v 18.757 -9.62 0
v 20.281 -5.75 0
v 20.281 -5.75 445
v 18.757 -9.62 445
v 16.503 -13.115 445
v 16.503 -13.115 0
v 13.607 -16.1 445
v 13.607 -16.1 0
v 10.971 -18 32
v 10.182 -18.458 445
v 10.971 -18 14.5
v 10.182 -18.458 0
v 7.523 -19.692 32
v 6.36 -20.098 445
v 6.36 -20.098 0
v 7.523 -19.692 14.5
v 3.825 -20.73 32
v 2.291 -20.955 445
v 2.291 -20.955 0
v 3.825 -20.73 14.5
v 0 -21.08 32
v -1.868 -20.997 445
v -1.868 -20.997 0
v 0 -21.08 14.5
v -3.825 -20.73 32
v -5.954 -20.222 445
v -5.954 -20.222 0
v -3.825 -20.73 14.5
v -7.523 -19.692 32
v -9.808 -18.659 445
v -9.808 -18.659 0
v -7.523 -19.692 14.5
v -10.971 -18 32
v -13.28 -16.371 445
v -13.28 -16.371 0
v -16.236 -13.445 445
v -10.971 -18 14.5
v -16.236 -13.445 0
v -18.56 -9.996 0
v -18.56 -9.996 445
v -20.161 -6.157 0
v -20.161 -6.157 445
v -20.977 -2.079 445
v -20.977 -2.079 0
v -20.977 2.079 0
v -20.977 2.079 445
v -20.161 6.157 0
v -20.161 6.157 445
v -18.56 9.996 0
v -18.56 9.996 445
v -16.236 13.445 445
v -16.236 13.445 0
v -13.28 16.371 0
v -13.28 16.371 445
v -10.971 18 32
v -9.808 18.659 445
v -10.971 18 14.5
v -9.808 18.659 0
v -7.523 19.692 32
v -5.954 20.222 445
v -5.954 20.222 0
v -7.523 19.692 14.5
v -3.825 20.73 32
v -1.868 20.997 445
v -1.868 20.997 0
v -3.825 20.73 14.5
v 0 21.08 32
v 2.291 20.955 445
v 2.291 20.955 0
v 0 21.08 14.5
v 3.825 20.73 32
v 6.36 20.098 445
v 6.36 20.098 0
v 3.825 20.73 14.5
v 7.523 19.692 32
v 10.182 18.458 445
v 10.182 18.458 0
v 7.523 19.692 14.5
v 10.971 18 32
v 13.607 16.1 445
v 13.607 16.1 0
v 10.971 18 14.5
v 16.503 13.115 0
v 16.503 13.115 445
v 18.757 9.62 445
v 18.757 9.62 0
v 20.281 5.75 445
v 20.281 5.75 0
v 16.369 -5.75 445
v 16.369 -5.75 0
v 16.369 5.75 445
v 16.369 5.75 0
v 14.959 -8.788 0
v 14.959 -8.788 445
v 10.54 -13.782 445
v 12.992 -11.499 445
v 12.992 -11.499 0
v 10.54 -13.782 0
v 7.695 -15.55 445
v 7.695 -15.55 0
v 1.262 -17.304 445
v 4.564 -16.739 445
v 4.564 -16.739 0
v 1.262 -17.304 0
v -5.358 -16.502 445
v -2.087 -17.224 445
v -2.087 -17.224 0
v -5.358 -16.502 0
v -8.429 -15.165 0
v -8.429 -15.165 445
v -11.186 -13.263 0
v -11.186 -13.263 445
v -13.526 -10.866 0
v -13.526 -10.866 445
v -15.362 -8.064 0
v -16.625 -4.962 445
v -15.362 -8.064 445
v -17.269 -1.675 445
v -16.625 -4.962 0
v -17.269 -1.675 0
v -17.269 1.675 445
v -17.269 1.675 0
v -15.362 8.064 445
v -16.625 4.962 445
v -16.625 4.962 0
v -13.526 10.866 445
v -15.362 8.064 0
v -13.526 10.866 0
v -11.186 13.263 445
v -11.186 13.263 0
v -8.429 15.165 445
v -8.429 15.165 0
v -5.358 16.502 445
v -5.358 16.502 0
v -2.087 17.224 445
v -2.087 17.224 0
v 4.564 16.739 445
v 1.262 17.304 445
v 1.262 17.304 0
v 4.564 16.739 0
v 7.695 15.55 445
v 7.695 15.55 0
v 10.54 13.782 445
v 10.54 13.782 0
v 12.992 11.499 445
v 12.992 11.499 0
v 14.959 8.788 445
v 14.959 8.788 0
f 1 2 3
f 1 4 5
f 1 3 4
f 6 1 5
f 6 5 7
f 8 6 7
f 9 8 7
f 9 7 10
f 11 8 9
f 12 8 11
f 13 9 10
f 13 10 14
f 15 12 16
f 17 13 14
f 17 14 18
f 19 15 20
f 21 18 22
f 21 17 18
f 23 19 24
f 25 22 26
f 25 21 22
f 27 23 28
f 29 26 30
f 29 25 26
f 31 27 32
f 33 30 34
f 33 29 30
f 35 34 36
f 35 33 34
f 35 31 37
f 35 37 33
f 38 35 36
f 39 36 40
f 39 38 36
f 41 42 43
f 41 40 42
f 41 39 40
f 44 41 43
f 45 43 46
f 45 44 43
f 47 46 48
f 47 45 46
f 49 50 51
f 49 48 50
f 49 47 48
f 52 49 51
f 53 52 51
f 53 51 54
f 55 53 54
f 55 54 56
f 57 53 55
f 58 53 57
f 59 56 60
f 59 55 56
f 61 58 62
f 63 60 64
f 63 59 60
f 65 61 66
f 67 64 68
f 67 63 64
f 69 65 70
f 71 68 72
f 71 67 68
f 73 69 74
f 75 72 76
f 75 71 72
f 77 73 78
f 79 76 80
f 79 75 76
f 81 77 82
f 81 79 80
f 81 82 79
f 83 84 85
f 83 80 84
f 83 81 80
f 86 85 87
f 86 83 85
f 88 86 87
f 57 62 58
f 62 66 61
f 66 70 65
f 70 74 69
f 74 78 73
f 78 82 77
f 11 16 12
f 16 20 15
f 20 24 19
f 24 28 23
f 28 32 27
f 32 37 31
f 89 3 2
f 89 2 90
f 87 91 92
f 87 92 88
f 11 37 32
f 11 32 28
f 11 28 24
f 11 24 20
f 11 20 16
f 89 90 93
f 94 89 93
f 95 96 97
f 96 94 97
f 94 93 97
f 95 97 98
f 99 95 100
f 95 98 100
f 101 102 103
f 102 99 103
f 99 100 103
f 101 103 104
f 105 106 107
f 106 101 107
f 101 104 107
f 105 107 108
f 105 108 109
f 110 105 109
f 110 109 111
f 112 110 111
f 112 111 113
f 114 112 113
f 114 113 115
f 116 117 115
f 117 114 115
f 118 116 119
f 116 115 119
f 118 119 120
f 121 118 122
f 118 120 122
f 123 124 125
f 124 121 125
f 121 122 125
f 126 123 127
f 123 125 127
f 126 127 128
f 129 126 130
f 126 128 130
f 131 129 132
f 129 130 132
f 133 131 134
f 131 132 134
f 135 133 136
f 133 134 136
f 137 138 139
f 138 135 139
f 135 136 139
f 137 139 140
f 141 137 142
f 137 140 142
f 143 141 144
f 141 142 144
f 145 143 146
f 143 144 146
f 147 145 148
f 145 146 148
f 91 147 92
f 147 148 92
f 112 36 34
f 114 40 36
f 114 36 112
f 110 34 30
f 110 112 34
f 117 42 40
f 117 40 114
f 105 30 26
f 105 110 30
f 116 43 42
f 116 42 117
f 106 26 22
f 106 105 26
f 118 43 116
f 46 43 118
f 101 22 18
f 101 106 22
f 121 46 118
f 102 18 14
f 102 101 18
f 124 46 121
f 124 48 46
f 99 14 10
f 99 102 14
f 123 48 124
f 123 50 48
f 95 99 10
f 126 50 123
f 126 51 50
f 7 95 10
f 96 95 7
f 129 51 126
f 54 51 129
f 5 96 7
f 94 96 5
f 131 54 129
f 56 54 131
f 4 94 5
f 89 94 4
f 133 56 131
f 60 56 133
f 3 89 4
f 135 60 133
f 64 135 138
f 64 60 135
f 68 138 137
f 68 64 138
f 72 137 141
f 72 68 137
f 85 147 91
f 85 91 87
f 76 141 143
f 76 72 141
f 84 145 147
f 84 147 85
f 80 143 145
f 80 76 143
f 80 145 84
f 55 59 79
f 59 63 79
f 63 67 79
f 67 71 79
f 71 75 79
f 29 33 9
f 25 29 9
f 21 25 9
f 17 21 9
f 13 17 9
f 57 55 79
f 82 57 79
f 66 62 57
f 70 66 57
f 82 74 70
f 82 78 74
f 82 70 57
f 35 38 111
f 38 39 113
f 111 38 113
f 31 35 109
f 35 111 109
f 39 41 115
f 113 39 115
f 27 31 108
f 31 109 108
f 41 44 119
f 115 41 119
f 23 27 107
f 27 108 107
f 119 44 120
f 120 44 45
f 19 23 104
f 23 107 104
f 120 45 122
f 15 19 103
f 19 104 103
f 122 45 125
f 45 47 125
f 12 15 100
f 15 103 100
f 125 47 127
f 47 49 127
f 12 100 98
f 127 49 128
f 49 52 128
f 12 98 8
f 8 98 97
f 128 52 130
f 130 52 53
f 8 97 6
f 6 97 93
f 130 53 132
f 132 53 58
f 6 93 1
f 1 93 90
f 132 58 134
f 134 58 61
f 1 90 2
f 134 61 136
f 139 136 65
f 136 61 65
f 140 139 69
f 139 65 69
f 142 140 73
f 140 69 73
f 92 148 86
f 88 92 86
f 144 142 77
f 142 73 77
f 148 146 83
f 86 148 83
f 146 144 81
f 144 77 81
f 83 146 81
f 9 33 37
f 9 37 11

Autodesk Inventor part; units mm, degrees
ref_plane "YZ Plane" through (0, 0, 0) normal (1, 0, 0) x (0, 1, 0)
ref_plane "XZ Plane" through (0, 0, 0) normal (0, 1, 0) x (-1, 0, 0)
sketch "Sketch1" plane through (0, 0, 0) normal (0, 0, 1) x (1, 0, 0)
  circle A0 centre (0, 0) radius 21.08
  circle A1 centre (0, 0) radius 17.35
  dimension "d0" = 42.16
  dimension "d1" = 3.73
extrude "Extrusion1" add sketch "Sketch1" along normal blind 445
ref_plane "Work Plane1" through (0, 0, 32) normal (0, 0, 1) x (1, 0, 0)
sketch "Sketch6" plane through (0, 0, 32) normal (0, 0, 1) x (1, 0, 0)
  line L0 (11.1371, -22.214) -> (-11.1371, -22.214)
  line L1 (-11.1371, -22.214) -> (-11.1371, -18)
  line L2 (-11.1371, -18) -> (11.1371, -18)
  line L3 (11.1371, -18) -> (11.1371, -22.214)
  line L4 (0, -22.214) -> (0, -18) construction
  line L5 (0, 0) -> (0, -21.08) construction
  circle A0 centre (0, 0) radius 21.08 projected
  line L6 (0, 0) -> (6.3886, 0) construction
  line L7 (11.1371, 22.214) -> (-11.1371, 22.214)
  line L8 (-11.1371, 22.214) -> (-11.1371, 18)
  line L9 (-11.1371, 18) -> (11.1371, 18)
  line L10 (11.1371, 18) -> (11.1371, 22.214)
  line L11 (0, 22.214) -> (0, 18) construction
  point P0 (20.2483, 5.8629)
  point P1 (21.08, 0)
  point P2 (0, 21.08)
  dimension "d10" = 18
extrude "Extrusion4" cut sketch "Sketch6" against normal blind 17.5 contours L0 L1 L2 A0 L3 | A0 L2 | L9 L8 L7 L10 A0 | A0 L9
sketch "Sketch7" plane through (0, 0, 445) normal (0, 0, 1) x (1, 0, 0)
  line L0 (30, -5.75) -> (0, -5.75)
  line L1 (0, -5.75) -> (0, 5.75)
  line L2 (0, 5.75) -> (30, 5.75)
  line L3 (30, 5.75) -> (30, -5.75)
  point P0 (0, 0)
  point P1 (0, 0)
  dimension "d13" = 30
  dimension "d14" = 11.5
extrude "Extrusion5" cut sketch "Sketch7" against normal up to next
properties part number "outer_sheath" material "Acetal Resin, White"
